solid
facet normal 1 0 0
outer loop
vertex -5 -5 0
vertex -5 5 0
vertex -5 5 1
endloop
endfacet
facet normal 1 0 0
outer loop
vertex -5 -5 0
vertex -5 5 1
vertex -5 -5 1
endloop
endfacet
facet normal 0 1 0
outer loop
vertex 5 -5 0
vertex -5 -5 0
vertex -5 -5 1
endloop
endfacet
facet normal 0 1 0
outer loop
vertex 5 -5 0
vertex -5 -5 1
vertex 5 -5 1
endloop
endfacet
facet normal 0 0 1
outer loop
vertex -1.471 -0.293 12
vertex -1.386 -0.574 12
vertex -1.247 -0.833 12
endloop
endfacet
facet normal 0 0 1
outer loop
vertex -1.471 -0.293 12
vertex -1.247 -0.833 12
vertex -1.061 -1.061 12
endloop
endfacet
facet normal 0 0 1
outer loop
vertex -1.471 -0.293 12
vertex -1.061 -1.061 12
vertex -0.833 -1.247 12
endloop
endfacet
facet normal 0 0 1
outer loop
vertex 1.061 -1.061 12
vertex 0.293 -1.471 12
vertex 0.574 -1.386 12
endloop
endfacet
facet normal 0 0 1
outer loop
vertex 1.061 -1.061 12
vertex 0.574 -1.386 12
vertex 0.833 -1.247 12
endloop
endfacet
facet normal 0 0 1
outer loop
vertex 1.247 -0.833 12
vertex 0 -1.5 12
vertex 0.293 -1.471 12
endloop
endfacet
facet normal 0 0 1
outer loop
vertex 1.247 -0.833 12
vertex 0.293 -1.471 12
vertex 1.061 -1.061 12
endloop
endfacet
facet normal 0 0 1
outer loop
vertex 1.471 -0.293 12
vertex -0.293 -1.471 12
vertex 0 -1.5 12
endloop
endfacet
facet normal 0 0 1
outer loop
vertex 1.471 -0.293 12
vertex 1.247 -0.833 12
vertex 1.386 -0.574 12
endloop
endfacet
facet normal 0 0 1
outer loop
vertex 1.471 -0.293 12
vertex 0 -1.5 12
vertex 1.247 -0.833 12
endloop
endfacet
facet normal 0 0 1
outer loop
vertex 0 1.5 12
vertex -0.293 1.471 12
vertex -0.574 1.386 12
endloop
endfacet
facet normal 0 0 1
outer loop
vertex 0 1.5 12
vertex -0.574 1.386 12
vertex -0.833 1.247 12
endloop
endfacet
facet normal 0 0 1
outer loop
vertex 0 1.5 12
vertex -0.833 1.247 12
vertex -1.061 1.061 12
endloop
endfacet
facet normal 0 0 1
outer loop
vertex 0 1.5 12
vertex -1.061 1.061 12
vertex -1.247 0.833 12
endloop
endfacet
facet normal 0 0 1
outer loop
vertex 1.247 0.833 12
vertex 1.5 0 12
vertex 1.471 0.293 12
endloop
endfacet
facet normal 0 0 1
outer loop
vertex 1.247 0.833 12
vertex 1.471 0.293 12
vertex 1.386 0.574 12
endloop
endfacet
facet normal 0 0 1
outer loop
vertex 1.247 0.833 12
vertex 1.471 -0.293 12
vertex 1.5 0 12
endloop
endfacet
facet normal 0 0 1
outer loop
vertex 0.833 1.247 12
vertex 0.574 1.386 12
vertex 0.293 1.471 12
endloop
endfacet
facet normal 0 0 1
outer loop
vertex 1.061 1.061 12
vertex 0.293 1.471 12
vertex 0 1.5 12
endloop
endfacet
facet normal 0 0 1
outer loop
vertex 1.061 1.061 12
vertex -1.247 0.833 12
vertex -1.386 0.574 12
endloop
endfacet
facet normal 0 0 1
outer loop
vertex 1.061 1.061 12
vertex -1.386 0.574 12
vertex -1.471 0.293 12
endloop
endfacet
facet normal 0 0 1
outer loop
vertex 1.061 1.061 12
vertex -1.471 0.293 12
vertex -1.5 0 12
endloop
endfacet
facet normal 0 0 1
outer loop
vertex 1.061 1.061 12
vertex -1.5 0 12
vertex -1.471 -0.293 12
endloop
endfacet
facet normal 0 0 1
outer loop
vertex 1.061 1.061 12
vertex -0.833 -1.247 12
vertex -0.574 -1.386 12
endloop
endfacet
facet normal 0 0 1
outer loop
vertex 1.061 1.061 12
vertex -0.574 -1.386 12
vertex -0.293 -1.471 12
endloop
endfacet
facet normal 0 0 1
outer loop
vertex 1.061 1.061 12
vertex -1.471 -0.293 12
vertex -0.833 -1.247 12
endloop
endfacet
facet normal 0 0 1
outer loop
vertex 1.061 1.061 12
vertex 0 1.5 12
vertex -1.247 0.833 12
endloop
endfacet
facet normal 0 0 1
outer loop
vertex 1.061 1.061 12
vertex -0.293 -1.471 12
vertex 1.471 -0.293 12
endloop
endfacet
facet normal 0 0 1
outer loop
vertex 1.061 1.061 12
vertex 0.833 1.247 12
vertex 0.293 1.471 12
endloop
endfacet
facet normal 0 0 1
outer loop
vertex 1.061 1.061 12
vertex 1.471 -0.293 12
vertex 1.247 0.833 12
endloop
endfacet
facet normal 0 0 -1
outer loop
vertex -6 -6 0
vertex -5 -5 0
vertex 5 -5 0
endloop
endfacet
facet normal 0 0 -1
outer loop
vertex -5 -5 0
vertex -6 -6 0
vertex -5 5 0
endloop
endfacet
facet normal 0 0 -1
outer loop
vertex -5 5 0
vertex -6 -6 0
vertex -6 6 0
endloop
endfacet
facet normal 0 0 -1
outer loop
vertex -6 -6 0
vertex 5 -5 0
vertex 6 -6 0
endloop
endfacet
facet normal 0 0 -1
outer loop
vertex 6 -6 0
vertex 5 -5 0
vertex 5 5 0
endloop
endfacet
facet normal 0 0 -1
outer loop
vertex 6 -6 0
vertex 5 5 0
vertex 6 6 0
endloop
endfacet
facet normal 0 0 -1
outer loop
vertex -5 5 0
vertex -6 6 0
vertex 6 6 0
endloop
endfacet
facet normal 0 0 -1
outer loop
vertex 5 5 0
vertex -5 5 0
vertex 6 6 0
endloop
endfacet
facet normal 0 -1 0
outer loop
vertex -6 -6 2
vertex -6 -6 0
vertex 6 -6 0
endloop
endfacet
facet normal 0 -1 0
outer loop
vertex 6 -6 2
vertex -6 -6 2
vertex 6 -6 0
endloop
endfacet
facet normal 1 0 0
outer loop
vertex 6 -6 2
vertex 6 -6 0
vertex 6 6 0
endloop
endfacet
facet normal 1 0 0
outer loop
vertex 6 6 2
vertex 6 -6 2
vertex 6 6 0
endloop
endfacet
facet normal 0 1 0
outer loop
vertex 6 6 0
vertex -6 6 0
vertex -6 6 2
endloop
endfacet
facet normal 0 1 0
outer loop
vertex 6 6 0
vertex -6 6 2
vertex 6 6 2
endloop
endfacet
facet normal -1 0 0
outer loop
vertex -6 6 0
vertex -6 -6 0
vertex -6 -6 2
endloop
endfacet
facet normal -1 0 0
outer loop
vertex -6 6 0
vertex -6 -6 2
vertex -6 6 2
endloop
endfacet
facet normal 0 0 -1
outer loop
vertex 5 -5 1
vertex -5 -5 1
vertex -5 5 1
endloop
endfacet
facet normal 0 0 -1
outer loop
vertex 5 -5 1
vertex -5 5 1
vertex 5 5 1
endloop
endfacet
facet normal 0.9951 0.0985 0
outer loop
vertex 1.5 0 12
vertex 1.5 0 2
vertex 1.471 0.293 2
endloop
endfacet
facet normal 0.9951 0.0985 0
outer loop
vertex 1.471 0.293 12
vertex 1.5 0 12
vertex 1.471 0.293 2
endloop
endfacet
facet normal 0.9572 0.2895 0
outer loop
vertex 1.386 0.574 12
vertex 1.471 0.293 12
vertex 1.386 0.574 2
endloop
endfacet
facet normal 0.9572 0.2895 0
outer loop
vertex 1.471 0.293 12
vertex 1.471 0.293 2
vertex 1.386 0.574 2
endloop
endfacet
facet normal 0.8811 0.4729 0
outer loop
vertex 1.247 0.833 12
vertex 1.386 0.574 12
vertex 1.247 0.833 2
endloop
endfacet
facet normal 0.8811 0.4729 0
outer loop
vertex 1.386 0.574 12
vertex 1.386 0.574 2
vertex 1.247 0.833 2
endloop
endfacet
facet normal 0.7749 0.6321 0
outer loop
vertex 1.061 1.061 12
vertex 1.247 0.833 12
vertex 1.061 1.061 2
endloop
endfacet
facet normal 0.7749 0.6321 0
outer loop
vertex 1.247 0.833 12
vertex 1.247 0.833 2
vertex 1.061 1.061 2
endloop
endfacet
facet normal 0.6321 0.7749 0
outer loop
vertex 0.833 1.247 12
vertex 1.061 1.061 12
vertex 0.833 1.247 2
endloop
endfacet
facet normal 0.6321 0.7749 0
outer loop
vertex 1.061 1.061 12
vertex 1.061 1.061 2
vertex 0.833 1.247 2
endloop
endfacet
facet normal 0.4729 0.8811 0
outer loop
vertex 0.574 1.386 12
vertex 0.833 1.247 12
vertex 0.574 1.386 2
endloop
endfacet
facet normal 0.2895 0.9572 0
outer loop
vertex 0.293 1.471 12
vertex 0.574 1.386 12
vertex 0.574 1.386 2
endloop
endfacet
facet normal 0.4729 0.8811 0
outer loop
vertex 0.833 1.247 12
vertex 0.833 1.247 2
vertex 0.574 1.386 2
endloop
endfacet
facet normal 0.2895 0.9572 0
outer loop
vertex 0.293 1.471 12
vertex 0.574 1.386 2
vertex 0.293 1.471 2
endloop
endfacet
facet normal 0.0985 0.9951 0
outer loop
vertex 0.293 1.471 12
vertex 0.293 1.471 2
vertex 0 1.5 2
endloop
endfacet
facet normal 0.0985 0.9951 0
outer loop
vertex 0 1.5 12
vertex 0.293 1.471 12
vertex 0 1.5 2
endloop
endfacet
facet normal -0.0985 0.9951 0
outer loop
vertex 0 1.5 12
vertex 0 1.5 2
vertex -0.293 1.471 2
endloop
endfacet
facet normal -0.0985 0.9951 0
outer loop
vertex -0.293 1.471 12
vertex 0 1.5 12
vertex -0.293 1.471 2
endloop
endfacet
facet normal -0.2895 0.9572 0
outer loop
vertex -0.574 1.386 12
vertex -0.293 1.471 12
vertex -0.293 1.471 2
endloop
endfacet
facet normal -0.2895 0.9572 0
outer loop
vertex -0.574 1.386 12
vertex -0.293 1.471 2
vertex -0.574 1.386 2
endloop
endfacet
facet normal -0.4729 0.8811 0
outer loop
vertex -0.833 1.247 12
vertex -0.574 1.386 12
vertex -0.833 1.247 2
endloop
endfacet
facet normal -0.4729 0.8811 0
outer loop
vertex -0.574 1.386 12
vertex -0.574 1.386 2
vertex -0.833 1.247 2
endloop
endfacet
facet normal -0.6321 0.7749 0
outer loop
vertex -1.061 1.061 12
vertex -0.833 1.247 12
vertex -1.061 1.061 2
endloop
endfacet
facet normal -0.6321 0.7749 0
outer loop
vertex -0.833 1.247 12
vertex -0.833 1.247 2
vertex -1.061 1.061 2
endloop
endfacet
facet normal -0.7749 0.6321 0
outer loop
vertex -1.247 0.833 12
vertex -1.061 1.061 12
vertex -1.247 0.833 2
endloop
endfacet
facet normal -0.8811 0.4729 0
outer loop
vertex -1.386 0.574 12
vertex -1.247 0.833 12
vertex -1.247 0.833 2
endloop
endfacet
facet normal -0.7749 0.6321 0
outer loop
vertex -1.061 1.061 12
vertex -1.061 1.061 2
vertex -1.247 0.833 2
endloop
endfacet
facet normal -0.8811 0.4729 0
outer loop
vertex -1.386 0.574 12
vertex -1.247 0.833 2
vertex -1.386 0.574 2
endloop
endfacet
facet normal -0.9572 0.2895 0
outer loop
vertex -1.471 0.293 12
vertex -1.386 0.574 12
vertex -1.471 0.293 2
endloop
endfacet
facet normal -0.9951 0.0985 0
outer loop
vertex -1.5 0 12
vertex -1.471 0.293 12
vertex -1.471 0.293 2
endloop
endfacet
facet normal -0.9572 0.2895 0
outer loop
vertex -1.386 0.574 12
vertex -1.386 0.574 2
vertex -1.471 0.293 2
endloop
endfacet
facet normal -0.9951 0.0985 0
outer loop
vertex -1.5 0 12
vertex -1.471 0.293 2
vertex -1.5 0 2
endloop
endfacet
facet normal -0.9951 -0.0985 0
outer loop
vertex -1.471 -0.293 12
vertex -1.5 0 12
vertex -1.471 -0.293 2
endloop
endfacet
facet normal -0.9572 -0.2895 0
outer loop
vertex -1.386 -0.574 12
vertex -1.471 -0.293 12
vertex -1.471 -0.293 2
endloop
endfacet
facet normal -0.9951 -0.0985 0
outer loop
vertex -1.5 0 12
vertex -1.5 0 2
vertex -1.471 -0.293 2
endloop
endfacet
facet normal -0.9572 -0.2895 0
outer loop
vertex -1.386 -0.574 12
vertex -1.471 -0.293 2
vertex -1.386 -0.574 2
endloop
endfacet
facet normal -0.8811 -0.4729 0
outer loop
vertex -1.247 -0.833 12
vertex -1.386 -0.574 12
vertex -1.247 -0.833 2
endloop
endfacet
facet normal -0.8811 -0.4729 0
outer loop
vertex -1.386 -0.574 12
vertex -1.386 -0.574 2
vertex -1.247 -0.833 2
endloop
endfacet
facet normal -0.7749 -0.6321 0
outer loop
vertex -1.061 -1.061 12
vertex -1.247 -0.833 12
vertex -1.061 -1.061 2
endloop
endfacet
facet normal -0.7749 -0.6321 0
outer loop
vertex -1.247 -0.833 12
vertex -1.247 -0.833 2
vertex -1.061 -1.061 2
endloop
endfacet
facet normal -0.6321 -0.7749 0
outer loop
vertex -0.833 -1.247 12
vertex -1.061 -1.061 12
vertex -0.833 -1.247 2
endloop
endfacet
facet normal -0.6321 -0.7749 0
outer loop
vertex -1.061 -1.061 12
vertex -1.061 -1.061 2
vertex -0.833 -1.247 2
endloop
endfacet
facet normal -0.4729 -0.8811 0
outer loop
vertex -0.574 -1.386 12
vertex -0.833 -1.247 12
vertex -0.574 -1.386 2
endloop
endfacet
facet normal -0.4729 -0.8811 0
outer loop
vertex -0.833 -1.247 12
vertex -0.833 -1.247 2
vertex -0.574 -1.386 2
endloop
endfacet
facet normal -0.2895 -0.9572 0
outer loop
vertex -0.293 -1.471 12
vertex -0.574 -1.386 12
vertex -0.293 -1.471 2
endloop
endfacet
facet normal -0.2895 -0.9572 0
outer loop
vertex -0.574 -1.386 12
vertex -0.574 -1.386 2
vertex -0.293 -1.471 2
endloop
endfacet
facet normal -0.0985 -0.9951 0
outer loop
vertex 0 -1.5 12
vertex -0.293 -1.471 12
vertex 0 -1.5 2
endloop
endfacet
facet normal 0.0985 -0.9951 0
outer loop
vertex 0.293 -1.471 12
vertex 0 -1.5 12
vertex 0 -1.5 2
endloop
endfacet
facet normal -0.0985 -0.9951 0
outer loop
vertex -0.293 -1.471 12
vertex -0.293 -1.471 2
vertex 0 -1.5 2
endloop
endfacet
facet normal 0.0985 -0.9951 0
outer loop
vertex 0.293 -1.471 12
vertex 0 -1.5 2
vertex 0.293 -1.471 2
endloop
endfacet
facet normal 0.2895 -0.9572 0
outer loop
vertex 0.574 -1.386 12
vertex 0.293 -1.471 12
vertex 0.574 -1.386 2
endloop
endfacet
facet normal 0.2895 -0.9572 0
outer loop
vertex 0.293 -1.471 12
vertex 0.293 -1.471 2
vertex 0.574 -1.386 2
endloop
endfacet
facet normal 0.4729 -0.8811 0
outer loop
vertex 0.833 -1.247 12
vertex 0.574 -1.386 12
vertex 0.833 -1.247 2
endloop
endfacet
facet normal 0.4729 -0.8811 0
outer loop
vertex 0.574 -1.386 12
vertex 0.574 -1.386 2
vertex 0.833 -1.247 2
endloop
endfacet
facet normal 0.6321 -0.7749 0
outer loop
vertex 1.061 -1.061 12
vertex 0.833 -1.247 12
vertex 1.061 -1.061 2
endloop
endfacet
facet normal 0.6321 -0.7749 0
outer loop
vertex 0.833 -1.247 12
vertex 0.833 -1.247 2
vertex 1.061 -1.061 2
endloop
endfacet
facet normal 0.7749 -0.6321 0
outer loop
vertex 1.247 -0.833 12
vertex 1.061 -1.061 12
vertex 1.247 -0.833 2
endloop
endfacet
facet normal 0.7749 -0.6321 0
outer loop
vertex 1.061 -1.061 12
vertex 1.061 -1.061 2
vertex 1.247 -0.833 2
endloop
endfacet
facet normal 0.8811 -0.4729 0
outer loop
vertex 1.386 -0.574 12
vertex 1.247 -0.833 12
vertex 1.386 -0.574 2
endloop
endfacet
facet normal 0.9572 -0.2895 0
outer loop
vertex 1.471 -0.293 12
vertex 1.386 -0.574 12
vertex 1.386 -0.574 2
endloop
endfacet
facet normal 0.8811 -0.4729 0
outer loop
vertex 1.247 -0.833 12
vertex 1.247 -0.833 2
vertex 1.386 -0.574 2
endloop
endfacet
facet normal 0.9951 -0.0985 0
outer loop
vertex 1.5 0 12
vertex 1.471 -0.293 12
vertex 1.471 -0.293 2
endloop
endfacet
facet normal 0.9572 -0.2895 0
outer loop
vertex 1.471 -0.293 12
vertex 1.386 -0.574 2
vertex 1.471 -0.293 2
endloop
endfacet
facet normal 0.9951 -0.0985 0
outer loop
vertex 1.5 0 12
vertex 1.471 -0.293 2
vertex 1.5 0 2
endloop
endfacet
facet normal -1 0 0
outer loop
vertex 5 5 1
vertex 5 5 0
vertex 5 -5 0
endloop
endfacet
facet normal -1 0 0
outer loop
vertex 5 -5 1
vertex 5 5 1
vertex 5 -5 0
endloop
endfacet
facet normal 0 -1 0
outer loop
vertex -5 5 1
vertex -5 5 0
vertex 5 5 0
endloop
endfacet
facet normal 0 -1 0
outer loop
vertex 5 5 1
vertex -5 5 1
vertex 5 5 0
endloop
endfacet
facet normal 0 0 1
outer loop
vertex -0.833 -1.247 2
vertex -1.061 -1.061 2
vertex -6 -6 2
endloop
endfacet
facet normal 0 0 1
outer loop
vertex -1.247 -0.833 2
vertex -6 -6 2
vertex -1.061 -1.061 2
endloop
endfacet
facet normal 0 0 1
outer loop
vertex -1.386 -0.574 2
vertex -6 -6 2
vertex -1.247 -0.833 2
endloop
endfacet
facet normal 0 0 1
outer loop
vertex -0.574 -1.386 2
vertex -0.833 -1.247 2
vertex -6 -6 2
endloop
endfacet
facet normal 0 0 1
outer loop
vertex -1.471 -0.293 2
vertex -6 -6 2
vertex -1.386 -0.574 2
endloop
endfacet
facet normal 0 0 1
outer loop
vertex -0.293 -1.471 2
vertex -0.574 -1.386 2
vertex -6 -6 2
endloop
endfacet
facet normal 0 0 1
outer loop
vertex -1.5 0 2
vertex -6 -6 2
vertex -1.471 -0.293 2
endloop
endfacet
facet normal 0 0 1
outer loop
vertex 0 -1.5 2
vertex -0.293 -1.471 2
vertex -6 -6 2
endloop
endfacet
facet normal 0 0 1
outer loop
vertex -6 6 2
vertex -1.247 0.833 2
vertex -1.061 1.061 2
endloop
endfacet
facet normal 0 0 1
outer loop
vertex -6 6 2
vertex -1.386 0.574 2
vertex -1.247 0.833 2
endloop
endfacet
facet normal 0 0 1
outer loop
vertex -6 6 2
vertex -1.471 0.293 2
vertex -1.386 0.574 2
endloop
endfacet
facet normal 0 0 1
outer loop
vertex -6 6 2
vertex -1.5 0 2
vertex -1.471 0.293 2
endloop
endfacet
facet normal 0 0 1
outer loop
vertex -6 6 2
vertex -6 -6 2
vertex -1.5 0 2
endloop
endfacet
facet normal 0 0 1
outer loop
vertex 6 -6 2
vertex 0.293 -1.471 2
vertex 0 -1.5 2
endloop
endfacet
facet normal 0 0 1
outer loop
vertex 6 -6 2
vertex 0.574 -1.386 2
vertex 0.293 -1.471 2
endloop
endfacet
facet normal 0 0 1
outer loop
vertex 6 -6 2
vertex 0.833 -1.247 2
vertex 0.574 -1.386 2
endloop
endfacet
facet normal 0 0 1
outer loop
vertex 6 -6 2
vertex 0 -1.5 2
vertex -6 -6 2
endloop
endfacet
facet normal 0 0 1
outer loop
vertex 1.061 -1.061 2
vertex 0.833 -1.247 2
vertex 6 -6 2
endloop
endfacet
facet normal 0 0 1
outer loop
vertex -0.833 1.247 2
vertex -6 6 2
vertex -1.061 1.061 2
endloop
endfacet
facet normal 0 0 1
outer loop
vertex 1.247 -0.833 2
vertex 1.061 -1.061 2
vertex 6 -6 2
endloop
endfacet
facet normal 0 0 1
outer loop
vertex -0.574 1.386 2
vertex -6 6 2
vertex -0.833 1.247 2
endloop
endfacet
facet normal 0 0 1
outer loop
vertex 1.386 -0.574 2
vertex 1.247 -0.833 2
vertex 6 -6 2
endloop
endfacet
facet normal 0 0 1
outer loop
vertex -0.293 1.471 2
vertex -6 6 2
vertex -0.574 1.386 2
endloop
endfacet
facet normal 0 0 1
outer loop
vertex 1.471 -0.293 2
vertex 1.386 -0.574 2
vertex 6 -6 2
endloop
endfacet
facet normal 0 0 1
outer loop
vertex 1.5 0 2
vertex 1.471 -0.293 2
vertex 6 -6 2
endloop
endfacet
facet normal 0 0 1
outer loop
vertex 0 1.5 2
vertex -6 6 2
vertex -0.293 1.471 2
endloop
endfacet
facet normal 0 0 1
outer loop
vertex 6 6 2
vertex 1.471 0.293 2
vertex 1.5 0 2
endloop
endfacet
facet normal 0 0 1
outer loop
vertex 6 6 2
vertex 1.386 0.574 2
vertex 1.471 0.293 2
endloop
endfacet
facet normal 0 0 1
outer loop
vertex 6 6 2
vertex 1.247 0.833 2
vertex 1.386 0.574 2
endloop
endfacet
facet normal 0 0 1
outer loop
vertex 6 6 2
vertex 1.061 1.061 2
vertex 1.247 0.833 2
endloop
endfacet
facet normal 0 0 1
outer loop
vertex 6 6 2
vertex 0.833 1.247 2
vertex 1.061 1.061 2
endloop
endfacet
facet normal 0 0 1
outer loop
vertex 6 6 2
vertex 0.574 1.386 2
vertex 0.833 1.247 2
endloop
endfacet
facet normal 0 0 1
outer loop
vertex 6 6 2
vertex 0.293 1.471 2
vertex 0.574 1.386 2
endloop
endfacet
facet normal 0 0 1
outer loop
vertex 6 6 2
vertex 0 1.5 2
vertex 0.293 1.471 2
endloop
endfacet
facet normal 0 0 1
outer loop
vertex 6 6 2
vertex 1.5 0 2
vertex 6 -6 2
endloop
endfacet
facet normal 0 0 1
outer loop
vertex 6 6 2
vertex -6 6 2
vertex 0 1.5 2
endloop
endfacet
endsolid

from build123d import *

# Parameters (mm, degrees)
F0_W     = 12
F0_H     = 12
F1_DEPTH = 2
F2_R     = 1.5
F3_DEPTH = 10
F4_W     = 10
F4_H     = 10
F5_DEPTH = 1


with BuildPart() as f1:
    # F0 (on Top) → F1 (new body)
    with BuildSketch(Plane.XY):
        Rectangle(F0_W, F0_H)
    extrude(amount=F1_DEPTH)

    # F2 (on face) → F3 (join)
    with BuildSketch(Plane.XY.offset(2)):
        Circle(F2_R)
    extrude(amount=F3_DEPTH)

    # F4 (on face) → F5 (cut)
    with BuildSketch(Plane(origin=(0, 0, 0), x_dir=(1, 0, 0), z_dir=(0, 0, -1))):
        Rectangle(F4_W, F4_H)
    extrude(amount=-F5_DEPTH, mode=Mode.SUBTRACT)


solid = f1.part
